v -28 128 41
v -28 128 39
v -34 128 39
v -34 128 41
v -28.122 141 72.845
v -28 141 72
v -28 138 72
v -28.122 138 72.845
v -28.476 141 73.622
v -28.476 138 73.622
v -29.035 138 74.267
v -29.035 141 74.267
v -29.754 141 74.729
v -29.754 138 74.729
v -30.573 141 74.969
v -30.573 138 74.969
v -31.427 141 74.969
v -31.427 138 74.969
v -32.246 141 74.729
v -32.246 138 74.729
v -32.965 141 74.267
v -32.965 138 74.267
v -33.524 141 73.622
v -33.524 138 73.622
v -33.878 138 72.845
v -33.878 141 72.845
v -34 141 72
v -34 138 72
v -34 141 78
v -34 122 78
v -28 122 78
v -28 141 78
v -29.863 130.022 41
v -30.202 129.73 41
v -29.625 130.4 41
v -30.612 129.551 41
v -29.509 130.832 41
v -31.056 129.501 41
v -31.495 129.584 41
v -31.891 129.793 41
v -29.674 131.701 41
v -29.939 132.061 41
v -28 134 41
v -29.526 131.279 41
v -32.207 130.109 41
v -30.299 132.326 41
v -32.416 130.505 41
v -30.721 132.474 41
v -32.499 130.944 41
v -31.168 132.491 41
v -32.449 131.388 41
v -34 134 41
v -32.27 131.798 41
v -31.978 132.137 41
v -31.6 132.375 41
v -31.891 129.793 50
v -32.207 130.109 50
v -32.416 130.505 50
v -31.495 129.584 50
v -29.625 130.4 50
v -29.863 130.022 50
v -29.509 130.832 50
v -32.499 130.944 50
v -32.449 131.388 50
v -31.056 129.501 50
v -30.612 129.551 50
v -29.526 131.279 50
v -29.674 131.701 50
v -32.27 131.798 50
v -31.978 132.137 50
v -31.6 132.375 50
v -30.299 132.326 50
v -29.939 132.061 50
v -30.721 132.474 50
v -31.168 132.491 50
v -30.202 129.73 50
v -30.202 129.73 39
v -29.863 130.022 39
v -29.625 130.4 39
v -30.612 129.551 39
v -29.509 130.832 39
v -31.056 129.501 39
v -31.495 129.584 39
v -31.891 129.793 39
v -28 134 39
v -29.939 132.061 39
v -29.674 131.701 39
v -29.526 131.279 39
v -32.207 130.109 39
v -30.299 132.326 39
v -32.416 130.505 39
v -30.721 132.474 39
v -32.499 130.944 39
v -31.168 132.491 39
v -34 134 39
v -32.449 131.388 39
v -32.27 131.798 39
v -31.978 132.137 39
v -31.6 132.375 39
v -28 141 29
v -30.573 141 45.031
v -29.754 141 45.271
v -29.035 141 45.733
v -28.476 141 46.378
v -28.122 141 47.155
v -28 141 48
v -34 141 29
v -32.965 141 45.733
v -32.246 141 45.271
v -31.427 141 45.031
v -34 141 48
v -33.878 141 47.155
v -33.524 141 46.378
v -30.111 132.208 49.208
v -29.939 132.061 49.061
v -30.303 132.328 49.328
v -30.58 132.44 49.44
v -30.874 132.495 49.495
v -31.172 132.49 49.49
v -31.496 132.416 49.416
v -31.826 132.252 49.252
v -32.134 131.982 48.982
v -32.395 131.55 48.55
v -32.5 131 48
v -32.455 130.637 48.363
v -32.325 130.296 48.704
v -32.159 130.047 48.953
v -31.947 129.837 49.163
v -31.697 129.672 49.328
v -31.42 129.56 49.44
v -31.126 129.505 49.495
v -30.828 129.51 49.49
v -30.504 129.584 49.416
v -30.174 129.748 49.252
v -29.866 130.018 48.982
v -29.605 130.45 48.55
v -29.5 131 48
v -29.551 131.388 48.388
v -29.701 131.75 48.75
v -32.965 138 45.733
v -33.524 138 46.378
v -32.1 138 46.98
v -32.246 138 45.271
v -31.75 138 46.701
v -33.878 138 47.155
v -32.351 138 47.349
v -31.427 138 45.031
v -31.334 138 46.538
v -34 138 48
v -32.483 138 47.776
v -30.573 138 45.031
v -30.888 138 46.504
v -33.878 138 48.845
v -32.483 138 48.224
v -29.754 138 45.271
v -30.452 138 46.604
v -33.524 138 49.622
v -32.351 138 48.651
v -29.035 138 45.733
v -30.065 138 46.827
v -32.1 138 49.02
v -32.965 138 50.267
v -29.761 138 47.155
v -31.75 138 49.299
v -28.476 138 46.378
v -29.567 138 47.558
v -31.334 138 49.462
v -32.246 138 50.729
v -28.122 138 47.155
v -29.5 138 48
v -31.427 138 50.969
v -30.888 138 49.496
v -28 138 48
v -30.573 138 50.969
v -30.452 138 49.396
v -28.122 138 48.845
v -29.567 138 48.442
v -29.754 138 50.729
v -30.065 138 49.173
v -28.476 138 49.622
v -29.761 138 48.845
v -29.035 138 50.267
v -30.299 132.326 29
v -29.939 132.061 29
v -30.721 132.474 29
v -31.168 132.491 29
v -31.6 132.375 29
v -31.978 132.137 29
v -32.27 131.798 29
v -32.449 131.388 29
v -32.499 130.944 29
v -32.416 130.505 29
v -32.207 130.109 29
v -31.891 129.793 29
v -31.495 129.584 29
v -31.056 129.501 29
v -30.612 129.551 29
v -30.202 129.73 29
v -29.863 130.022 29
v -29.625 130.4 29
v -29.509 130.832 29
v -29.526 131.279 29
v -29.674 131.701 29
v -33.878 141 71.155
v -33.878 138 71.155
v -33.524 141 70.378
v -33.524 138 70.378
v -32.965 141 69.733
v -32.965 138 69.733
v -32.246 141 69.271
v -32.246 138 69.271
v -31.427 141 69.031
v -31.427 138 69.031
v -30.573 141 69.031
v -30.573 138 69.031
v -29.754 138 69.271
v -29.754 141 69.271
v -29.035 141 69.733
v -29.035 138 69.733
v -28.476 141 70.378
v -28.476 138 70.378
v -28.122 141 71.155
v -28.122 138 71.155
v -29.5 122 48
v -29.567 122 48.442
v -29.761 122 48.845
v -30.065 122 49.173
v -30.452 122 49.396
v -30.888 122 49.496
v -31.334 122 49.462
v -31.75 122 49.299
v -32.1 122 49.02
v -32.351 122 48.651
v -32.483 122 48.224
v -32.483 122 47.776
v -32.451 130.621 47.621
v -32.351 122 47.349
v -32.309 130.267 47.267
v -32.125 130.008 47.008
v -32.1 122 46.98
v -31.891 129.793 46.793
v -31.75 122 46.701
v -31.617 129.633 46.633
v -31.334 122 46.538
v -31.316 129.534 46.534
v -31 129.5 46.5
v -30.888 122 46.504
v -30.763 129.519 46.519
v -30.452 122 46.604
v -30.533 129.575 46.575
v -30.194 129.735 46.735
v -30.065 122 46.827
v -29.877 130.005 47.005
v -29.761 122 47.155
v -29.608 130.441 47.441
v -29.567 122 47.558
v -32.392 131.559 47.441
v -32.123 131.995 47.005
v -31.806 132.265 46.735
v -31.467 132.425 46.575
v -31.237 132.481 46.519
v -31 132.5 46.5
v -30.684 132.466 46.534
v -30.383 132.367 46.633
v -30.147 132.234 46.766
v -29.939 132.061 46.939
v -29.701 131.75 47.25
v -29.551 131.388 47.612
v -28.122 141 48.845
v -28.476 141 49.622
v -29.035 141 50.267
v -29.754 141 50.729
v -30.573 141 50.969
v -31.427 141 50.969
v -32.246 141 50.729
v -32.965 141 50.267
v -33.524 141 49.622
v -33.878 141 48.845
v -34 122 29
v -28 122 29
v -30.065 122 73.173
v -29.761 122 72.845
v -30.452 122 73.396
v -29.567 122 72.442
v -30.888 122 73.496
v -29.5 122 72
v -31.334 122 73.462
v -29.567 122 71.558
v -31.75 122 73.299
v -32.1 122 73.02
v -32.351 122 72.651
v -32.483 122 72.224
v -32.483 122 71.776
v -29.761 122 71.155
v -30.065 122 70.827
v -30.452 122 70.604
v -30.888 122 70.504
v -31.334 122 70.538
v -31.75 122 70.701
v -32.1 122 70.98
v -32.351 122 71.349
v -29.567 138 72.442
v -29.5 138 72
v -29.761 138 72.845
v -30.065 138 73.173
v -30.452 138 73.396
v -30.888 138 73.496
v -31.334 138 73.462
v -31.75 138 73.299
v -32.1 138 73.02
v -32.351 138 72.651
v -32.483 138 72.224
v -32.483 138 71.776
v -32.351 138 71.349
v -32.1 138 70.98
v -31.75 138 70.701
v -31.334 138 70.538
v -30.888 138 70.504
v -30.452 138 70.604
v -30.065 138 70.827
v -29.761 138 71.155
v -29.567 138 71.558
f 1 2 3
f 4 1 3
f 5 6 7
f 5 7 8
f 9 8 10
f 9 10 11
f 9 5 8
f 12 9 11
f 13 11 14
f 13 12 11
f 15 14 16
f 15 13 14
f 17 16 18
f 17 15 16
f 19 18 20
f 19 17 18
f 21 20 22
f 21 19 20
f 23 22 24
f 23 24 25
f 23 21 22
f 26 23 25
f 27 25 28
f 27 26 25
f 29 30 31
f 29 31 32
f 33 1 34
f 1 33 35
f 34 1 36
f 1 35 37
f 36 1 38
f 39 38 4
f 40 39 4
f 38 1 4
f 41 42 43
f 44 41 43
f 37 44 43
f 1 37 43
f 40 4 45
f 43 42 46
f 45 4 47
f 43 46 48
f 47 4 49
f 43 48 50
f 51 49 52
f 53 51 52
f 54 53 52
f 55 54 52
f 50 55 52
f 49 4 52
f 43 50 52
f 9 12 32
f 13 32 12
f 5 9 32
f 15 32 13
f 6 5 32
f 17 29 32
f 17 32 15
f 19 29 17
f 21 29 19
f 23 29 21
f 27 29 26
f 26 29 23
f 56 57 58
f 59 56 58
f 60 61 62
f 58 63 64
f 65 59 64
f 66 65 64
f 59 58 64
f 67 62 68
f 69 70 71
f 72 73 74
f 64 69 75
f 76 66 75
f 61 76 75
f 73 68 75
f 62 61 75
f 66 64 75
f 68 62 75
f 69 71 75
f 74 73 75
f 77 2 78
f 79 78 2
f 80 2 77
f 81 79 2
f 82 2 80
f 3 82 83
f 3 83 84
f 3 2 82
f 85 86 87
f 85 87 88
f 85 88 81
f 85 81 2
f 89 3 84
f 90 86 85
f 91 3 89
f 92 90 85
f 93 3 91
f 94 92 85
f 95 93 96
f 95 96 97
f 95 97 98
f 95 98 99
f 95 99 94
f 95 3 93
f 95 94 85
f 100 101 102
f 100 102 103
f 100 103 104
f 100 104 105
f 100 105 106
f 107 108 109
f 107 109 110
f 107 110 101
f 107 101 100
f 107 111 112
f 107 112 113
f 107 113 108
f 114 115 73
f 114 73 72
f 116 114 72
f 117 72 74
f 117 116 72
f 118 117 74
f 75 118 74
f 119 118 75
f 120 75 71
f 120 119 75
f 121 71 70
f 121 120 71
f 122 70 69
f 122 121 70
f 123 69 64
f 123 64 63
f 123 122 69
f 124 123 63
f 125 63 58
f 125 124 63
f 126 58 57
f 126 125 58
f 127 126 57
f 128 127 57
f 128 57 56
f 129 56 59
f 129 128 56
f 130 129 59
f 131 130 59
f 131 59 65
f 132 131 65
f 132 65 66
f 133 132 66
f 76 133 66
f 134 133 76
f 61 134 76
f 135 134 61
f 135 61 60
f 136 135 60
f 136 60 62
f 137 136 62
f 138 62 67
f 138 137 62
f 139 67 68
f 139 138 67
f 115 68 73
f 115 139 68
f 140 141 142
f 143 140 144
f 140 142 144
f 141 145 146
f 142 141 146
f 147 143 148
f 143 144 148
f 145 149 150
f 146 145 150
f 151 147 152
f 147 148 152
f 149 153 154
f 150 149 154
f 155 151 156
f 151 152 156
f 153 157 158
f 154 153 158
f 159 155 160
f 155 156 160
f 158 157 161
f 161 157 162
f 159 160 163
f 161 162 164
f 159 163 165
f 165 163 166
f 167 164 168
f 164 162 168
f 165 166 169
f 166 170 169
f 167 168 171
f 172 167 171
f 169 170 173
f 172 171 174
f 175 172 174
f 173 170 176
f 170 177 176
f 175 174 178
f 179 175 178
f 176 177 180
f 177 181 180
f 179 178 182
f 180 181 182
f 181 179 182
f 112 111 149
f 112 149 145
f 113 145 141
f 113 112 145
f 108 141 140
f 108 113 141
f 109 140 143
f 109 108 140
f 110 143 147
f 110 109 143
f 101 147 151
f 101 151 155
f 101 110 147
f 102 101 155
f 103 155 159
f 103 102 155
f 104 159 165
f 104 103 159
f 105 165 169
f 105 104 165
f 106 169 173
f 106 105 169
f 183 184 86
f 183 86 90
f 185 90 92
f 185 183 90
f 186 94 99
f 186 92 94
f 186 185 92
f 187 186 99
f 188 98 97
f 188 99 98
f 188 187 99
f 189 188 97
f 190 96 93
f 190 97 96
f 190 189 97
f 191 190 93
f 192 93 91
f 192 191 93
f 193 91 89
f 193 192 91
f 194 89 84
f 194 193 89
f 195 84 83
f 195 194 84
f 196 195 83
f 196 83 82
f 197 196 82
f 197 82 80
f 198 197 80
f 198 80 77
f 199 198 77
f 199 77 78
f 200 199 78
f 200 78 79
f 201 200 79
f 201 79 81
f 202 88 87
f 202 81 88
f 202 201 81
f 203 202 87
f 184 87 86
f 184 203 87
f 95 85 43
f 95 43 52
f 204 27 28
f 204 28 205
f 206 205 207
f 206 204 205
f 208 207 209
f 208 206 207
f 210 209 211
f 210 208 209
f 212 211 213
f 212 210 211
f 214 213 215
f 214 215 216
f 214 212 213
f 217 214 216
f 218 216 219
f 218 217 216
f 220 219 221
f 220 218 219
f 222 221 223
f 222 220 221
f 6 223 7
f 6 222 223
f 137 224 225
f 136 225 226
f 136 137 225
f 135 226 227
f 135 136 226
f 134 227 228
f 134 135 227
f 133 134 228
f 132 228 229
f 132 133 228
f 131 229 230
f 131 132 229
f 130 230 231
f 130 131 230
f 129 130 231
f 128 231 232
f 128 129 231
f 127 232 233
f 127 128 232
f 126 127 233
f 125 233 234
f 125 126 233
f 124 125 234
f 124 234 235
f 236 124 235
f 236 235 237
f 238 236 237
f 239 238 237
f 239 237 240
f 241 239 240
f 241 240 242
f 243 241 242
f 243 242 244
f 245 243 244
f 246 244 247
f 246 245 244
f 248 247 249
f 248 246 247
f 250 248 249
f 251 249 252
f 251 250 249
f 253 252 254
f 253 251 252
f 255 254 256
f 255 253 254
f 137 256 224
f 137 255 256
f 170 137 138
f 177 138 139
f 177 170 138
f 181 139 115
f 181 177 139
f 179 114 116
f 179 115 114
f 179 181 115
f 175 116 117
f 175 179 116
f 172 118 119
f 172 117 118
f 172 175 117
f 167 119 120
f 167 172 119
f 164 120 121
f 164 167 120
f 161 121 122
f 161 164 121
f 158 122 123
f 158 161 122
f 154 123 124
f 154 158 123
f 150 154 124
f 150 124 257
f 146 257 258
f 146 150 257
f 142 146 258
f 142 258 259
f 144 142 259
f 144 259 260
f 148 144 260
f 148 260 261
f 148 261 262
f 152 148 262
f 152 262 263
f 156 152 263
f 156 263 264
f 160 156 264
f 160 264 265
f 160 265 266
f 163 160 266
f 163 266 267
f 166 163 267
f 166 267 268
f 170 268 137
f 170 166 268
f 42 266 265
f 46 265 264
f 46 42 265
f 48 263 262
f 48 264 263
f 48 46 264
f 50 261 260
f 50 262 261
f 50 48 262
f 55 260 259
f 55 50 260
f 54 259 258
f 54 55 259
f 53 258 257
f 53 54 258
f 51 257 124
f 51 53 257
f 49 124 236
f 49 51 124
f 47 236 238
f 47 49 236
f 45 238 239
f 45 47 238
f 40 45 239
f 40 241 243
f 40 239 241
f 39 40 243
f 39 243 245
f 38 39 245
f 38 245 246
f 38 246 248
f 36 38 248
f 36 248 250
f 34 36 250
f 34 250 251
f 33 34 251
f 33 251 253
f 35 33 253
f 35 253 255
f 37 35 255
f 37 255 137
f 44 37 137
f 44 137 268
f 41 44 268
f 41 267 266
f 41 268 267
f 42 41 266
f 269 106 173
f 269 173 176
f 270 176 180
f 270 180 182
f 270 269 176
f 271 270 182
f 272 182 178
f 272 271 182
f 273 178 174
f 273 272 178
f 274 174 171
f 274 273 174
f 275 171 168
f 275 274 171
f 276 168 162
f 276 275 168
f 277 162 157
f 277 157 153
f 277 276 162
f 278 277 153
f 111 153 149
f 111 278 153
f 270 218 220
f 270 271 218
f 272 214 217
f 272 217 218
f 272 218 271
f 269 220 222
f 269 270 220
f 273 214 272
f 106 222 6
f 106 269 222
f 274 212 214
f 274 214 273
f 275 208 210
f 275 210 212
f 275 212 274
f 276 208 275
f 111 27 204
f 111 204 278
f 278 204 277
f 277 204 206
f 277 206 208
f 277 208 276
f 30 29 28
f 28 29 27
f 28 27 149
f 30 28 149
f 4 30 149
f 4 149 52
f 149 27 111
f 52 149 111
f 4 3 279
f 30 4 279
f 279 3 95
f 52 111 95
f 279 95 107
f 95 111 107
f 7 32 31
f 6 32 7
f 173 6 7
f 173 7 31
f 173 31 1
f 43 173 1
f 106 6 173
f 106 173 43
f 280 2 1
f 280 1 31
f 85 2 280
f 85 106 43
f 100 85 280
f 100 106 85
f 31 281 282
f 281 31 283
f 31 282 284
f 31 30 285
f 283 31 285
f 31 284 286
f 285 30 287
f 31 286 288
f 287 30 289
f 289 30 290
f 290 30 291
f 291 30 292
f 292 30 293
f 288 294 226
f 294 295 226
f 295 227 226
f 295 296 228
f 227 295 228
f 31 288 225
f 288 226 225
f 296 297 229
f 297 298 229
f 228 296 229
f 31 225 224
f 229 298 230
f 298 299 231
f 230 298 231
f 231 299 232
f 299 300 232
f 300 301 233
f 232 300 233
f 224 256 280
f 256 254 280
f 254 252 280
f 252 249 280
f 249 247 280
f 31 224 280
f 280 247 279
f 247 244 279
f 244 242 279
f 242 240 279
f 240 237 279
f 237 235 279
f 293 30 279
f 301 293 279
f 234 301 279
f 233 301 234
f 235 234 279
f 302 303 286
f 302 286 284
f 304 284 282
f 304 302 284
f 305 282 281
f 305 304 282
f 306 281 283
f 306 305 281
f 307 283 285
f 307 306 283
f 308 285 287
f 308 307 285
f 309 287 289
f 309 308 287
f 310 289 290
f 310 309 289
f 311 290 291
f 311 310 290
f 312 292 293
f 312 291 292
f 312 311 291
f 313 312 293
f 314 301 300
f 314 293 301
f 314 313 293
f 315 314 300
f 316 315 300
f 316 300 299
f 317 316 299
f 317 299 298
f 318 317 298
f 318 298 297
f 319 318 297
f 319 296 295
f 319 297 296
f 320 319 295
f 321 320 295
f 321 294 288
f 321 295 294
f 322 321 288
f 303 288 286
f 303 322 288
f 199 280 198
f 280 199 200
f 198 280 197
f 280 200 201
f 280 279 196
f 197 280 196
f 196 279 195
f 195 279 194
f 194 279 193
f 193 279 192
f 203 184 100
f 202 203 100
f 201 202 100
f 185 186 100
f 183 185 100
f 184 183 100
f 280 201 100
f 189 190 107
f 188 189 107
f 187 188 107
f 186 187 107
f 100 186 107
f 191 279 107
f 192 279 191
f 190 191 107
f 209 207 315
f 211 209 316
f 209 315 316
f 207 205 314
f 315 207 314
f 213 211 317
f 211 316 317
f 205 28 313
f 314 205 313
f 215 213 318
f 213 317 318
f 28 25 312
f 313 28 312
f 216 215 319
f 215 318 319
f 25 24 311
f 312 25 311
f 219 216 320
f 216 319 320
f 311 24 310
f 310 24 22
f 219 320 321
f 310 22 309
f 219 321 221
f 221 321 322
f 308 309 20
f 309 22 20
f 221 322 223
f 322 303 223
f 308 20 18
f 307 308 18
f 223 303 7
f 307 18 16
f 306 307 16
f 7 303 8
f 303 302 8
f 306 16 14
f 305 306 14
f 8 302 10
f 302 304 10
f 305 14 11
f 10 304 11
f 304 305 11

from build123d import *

# Parameters (mm, degrees)
CYLINDER1866_R               = 3
CYLINDER1866_DEPTH           = 3
CYLINDER1865_R               = 3
CYLINDER1865_DEPTH           = 3
CYLINDER1867_R               = 3
CYLINDER1867_DEPTH           = 3
CYLINDER1868_R               = 3
CYLINDER1868_DEPTH           = 3
CYLINDER1854_R               = 1.5
CYLINDER1854_DEPTH           = 50
CYLINDER1855_R               = 1.5
CYLINDER1855_DEPTH           = 50
CYLINDER1856_R               = 1.5
CYLINDER1856_DEPTH           = 50
CYLINDER1853_R               = 1.5
CYLINDER1853_DEPTH           = 50
CYLINDER1851_R               = 1.5
CYLINDER1851_DEPTH           = 50
CYLINDER1851_PLACEMENT_ANGLE = 45
BOX771_W                     = 6
BOX771_H                     = 8
BOX771_DEPTH                 = 2
BOX772_W                     = 49
BOX772_H                     = 19
BOX772_DEPTH                 = 6


with BuildPart() as v_lec1866:
    # Cylinder1866 → Cylinder1866 (new body)
    with BuildSketch(Plane(origin=(-31, 150, 72), x_dir=(1, 0, 0), z_dir=(0, -1, 0))):
        Circle(CYLINDER1866_R)
    extrude(amount=CYLINDER1866_DEPTH)


with BuildPart() as v_lec1865:
    # Cylinder1865 → Cylinder1865 (new body)
    with BuildSketch(Plane(origin=(31, 150, 48), x_dir=(1, 0, 0), z_dir=(0, -1, 0))):
        Circle(CYLINDER1865_R)
    extrude(amount=CYLINDER1865_DEPTH)


with BuildPart() as v_lec1867:
    # Cylinder1867 → Cylinder1867 (new body)
    with BuildSketch(Plane(origin=(31, 150, 72), x_dir=(1, 0, 0), z_dir=(0, -1, 0))):
        Circle(CYLINDER1867_R)
    extrude(amount=CYLINDER1867_DEPTH)


with BuildPart() as compound933:
    # Cylinder1868 → Cylinder1868 (new body)
    with BuildSketch(Plane(origin=(-31, 150, 48), x_dir=(1, 0, 0), z_dir=(0, -1, 0))):
        Circle(CYLINDER1868_R)
    extrude(amount=CYLINDER1868_DEPTH)

    # Compound933: union Válec1866, Válec1865, Válec1867
    add(v_lec1866.part)
    add(v_lec1865.part)
    add(v_lec1867.part)


with BuildPart() as compound933_1:
    # Compound933 placement: moved
    add(compound933.part.moved(Location((0, -9, 0))))


with BuildPart() as v_lec1854:
    # Cylinder1854 → Cylinder1854 (new body)
    with BuildSketch(Plane(origin=(-31, 150, 72), x_dir=(1, 0, 0), z_dir=(0, -1, 0))):
        Circle(CYLINDER1854_R)
    extrude(amount=CYLINDER1854_DEPTH)


with BuildPart() as v_lec1855:
    # Cylinder1855 → Cylinder1855 (new body)
    with BuildSketch(Plane(origin=(31, 150, 48), x_dir=(1, 0, 0), z_dir=(0, -1, 0))):
        Circle(CYLINDER1855_R)
    extrude(amount=CYLINDER1855_DEPTH)


with BuildPart() as v_lec1856:
    # Cylinder1856 → Cylinder1856 (new body)
    with BuildSketch(Plane(origin=(31, 150, 72), x_dir=(1, 0, 0), z_dir=(0, -1, 0))):
        Circle(CYLINDER1856_R)
    extrude(amount=CYLINDER1856_DEPTH)


with BuildPart() as compound930:
    # Cylinder1853 → Cylinder1853 (new body)
    with BuildSketch(Plane(origin=(-31, 150, 48), x_dir=(1, 0, 0), z_dir=(0, -1, 0))):
        Circle(CYLINDER1853_R)
    extrude(amount=CYLINDER1853_DEPTH)

    # Compound930: union Válec1854, Válec1855, Válec1856
    add(v_lec1854.part)
    add(v_lec1855.part)
    add(v_lec1856.part)


with BuildPart() as compound927:
    # Cylinder1851 → Cylinder1851 (new body)
    with BuildSketch(Plane.XY):
        Circle(CYLINDER1851_R)
    extrude(amount=CYLINDER1851_DEPTH)


with BuildPart() as compound927_1:
    # Cylinder1851 placement: moved
    add(compound927.part.moved(Location((-31, 92, 0))).rotate(Axis((-31, 92, 0), (0, 0, 1)), CYLINDER1851_PLACEMENT_ANGLE))


with BuildPart() as compound926:
    # Box771 → Box771 (new body)
    with BuildSketch(Plane(origin=(-27, 89, 39), x_dir=(0, 1, 0), z_dir=(0, 0, 1))):
        with Locations((3, 4)):
            Rectangle(BOX771_W, BOX771_H)
    extrude(amount=BOX771_DEPTH)


with BuildPart() as cut579:
    # Box772 → Box772 (new body)
    with BuildSketch(Plane(origin=(-34, 83, 78), x_dir=(0, 0, -1), z_dir=(1, 0, 0))):
        with Locations((24.5, 9.5)):
            Rectangle(BOX772_W, BOX772_H)
    extrude(amount=BOX772_DEPTH)

    # Cut574: cut Compound926
    add(compound926.part, mode=Mode.SUBTRACT)

    # Cut575: cut Compound927
    add(compound927_1.part, mode=Mode.SUBTRACT)


with BuildPart() as cut579_1:
    # Cut575 placement: moved
    add(cut579.part.moved(Location((0, 39, 0))))

    # Cut578: cut Compound930
    add(compound930.part, mode=Mode.SUBTRACT)

    # Cut579: cut Compound933
    add(compound933_1.part, mode=Mode.SUBTRACT)


solid = cut579_1.part
